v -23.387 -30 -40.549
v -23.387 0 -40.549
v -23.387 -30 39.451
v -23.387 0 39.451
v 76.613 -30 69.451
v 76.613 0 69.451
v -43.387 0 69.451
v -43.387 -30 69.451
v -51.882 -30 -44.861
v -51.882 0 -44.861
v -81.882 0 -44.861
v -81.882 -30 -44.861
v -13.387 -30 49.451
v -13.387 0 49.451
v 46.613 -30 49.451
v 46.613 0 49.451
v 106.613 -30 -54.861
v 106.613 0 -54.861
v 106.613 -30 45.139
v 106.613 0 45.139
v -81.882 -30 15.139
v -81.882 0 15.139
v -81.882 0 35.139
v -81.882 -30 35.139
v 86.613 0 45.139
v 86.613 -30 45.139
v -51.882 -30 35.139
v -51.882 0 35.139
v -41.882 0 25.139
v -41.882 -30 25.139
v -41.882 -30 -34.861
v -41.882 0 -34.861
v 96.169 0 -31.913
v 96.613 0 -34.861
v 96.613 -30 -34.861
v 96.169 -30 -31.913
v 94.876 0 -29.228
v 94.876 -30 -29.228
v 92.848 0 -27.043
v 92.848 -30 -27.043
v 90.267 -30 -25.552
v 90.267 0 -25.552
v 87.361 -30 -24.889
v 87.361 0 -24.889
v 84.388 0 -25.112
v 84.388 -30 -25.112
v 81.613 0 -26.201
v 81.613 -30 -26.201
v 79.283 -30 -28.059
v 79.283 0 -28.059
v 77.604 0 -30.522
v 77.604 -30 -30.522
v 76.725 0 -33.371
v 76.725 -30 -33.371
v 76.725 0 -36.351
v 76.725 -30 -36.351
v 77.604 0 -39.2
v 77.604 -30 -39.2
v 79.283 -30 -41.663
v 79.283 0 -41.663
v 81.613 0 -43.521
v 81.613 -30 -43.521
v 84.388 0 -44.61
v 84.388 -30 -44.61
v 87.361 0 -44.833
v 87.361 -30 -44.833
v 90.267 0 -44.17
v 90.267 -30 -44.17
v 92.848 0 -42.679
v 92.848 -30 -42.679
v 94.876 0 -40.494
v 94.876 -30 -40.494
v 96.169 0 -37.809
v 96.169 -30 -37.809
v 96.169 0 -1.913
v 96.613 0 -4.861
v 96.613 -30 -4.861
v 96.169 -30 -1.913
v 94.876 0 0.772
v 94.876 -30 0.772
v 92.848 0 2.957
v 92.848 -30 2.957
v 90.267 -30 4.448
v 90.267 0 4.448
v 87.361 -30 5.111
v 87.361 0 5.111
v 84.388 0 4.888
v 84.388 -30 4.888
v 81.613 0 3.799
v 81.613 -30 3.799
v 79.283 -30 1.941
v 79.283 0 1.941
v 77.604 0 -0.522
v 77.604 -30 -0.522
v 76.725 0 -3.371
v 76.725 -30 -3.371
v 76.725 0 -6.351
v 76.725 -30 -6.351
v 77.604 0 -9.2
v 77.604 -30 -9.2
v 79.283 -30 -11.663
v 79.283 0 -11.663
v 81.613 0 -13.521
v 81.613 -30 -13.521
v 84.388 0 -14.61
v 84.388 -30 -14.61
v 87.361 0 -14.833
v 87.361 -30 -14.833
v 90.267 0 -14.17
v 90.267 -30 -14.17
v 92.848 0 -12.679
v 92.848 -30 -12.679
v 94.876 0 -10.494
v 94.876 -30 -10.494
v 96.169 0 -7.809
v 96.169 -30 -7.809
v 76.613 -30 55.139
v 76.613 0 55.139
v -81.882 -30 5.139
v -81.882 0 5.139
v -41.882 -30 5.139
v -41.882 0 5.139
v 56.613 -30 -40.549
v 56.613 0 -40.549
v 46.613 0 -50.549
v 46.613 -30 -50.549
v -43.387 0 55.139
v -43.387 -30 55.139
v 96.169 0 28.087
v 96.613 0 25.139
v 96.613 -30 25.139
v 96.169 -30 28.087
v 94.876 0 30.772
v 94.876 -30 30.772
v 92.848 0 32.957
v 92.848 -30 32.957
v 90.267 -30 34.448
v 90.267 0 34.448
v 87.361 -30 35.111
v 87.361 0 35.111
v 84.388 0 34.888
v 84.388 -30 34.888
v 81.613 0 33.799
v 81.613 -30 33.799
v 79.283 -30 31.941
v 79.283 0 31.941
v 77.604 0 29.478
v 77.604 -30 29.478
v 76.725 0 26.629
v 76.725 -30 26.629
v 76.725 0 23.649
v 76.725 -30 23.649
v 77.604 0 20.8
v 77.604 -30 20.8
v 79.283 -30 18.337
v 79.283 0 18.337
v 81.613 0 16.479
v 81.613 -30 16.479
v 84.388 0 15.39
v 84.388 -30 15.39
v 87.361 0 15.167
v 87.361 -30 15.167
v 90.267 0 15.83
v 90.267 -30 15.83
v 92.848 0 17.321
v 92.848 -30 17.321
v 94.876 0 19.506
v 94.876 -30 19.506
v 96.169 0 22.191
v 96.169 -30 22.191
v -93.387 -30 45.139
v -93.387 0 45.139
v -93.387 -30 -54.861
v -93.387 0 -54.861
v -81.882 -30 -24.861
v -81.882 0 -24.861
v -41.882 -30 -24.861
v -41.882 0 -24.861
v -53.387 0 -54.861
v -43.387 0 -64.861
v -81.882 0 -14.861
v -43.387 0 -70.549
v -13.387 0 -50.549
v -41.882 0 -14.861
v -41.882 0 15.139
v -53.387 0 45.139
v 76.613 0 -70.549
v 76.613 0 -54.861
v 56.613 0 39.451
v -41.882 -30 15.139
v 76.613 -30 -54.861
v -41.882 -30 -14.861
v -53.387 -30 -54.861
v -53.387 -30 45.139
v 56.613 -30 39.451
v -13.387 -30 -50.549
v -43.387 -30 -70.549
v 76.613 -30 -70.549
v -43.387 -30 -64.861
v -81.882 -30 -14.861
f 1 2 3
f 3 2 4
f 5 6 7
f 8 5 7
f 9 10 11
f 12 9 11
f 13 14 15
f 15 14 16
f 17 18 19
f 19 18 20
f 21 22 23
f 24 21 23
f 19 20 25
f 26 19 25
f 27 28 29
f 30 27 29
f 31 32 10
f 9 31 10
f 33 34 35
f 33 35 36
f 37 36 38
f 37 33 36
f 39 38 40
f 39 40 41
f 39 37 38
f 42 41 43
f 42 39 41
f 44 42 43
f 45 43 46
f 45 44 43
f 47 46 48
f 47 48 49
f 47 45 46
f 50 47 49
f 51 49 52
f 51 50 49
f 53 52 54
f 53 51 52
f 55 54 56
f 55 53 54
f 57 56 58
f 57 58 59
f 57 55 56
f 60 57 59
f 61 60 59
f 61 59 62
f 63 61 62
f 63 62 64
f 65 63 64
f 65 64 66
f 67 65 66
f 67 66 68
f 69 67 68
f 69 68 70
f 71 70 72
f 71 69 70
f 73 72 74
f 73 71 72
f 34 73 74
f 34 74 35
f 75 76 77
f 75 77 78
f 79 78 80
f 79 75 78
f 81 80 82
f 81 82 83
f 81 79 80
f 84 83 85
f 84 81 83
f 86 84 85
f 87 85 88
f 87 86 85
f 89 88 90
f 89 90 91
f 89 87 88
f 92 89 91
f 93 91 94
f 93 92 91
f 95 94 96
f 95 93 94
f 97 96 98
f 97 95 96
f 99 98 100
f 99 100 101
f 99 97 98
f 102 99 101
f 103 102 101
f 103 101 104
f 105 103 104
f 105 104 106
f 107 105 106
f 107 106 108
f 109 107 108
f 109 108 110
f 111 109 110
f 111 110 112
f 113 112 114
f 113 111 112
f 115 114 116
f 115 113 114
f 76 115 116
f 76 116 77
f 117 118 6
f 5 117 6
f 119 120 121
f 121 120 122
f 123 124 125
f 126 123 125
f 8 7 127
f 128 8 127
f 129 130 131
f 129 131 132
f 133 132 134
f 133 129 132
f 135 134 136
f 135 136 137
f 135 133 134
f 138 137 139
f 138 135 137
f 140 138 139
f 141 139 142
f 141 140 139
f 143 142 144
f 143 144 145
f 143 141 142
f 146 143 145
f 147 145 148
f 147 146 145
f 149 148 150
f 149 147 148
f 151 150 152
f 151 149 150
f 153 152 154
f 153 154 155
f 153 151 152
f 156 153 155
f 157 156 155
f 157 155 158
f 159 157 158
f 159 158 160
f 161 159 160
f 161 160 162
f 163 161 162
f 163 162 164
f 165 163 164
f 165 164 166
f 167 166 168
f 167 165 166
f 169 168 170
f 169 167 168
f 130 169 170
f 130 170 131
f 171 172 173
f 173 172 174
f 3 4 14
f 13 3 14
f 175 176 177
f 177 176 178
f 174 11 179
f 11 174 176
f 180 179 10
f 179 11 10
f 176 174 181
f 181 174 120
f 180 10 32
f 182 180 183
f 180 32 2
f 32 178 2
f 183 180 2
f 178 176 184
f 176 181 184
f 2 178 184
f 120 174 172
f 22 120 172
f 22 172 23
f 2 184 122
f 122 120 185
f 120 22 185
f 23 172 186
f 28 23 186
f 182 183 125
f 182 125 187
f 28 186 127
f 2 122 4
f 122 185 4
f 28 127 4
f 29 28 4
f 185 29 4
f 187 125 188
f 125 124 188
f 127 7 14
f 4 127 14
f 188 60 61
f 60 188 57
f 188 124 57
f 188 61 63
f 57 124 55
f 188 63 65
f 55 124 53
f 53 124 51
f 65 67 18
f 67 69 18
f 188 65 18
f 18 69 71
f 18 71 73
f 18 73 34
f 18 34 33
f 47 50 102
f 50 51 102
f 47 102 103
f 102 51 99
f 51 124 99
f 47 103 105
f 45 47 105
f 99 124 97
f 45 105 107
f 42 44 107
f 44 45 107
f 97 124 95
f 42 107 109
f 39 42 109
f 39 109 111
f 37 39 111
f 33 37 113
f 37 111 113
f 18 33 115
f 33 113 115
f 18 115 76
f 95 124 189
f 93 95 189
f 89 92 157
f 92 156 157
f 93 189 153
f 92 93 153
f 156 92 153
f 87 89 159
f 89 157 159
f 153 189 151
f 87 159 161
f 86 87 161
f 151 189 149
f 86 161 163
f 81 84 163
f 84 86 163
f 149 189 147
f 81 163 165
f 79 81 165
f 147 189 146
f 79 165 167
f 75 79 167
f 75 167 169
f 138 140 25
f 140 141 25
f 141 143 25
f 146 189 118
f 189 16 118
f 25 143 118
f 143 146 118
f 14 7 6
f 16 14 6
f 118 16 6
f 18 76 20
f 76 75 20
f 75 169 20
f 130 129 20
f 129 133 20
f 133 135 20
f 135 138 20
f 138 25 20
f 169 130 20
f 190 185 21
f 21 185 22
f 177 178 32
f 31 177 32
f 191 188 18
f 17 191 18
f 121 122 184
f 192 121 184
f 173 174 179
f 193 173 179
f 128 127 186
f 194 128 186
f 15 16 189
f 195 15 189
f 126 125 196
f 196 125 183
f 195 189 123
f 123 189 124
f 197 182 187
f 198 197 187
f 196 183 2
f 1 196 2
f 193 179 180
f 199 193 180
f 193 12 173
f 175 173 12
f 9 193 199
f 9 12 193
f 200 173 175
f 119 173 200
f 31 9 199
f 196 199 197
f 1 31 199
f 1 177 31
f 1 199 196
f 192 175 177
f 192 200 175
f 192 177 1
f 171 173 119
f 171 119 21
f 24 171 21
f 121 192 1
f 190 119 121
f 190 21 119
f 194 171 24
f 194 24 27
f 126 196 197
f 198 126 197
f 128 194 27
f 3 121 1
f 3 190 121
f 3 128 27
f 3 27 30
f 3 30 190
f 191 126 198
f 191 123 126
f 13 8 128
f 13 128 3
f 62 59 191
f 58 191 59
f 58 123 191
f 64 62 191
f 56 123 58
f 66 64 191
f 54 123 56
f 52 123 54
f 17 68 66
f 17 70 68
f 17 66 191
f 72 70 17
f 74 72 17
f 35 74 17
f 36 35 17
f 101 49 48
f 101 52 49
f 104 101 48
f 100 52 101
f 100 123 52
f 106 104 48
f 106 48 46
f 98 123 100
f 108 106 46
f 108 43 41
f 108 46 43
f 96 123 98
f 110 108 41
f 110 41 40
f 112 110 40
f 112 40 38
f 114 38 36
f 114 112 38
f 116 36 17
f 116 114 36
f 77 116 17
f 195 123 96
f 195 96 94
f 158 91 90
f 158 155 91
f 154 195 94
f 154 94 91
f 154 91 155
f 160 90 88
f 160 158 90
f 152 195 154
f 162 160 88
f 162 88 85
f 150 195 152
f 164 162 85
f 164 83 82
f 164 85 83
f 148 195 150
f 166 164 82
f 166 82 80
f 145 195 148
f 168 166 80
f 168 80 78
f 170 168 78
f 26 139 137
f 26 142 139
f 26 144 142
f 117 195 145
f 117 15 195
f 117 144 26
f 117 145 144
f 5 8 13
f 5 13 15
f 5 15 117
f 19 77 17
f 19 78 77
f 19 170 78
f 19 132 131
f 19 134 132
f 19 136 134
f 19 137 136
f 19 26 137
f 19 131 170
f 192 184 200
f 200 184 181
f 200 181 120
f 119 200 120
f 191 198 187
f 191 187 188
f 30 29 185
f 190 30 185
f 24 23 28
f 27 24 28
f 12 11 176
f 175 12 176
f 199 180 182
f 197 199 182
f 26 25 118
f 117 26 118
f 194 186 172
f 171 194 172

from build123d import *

# Parameters (mm, degrees)
F0_R     = 10
F1_DEPTH = 30


with BuildPart() as f1:
    # F0 (on Front) → F1 (new body)
    with BuildSketch(Plane.XZ):
        Polygon((-43.386797, 55.138951), (-53.386797, 45.138951), (-93.386797, 45.138951), (-93.386797, -54.861049), (-53.386797, -54.861049), (-43.386797, -64.861049), (-43.386797, -70.548529), (66.613203, -70.548529), (76.613203, -70.548529), (76.613203, -64.861049), (76.613203, -60.548529), (76.613203, -54.861049), (86.613203, -54.861049), (96.613203, -54.861049), (106.613203, -54.861049), (106.613203, -44.861049), (106.613203, 35.138951), (106.613203, 45.138951), (96.613203, 45.138951), (86.613203, 45.138951), (76.613203, 55.138951), (76.613203, 59.451471), (76.613203, 69.451471), (66.613203, 69.451471), (-33.386797, 69.451471), (-43.386797, 69.451471), (-43.386797, 59.451471), align=None)
        Polygon((-81.881762, -44.861049), (-81.881762, -24.861049), (-51.881762, -24.861049), (-41.881762, -24.861049), (-41.881762, -34.861049), (-51.881762, -44.861049), align=None, mode=Mode.SUBTRACT)
        Polygon((-81.881762, -14.861049), (-81.881762, 5.138951), (-51.881762, 5.138951), (-41.881762, 5.138951), (-41.881762, -4.861049), (-41.881762, -14.861049), align=None, mode=Mode.SUBTRACT)
        with Locations((86.613203, -34.861049)):
            Circle(F0_R, mode=Mode.SUBTRACT)
        with Locations((86.613203, -4.861049)):
            Circle(F0_R, mode=Mode.SUBTRACT)
        Polygon((-81.881762, 15.138951), (-81.881762, 35.138951), (-51.881762, 35.138951), (-41.881762, 25.138951), (-41.881762, 15.138951), align=None, mode=Mode.SUBTRACT)
        Polygon((-23.386797, 39.451471), (-13.386797, 49.451471), (46.613203, 49.451471), (56.613203, 39.451471), (56.613203, 24.451471), (56.613203, -0.548529), (56.613203, -40.548529), (46.613203, -50.548529), (-13.386797, -50.548529), (-23.386797, -40.548529), (-23.386797, -0.548529), (-23.386797, 24.451471), align=None, mode=Mode.SUBTRACT)
        with Locations((86.613203, 25.138951)):
            Circle(F0_R, mode=Mode.SUBTRACT)
    extrude(amount=F1_DEPTH)


solid = f1.part
